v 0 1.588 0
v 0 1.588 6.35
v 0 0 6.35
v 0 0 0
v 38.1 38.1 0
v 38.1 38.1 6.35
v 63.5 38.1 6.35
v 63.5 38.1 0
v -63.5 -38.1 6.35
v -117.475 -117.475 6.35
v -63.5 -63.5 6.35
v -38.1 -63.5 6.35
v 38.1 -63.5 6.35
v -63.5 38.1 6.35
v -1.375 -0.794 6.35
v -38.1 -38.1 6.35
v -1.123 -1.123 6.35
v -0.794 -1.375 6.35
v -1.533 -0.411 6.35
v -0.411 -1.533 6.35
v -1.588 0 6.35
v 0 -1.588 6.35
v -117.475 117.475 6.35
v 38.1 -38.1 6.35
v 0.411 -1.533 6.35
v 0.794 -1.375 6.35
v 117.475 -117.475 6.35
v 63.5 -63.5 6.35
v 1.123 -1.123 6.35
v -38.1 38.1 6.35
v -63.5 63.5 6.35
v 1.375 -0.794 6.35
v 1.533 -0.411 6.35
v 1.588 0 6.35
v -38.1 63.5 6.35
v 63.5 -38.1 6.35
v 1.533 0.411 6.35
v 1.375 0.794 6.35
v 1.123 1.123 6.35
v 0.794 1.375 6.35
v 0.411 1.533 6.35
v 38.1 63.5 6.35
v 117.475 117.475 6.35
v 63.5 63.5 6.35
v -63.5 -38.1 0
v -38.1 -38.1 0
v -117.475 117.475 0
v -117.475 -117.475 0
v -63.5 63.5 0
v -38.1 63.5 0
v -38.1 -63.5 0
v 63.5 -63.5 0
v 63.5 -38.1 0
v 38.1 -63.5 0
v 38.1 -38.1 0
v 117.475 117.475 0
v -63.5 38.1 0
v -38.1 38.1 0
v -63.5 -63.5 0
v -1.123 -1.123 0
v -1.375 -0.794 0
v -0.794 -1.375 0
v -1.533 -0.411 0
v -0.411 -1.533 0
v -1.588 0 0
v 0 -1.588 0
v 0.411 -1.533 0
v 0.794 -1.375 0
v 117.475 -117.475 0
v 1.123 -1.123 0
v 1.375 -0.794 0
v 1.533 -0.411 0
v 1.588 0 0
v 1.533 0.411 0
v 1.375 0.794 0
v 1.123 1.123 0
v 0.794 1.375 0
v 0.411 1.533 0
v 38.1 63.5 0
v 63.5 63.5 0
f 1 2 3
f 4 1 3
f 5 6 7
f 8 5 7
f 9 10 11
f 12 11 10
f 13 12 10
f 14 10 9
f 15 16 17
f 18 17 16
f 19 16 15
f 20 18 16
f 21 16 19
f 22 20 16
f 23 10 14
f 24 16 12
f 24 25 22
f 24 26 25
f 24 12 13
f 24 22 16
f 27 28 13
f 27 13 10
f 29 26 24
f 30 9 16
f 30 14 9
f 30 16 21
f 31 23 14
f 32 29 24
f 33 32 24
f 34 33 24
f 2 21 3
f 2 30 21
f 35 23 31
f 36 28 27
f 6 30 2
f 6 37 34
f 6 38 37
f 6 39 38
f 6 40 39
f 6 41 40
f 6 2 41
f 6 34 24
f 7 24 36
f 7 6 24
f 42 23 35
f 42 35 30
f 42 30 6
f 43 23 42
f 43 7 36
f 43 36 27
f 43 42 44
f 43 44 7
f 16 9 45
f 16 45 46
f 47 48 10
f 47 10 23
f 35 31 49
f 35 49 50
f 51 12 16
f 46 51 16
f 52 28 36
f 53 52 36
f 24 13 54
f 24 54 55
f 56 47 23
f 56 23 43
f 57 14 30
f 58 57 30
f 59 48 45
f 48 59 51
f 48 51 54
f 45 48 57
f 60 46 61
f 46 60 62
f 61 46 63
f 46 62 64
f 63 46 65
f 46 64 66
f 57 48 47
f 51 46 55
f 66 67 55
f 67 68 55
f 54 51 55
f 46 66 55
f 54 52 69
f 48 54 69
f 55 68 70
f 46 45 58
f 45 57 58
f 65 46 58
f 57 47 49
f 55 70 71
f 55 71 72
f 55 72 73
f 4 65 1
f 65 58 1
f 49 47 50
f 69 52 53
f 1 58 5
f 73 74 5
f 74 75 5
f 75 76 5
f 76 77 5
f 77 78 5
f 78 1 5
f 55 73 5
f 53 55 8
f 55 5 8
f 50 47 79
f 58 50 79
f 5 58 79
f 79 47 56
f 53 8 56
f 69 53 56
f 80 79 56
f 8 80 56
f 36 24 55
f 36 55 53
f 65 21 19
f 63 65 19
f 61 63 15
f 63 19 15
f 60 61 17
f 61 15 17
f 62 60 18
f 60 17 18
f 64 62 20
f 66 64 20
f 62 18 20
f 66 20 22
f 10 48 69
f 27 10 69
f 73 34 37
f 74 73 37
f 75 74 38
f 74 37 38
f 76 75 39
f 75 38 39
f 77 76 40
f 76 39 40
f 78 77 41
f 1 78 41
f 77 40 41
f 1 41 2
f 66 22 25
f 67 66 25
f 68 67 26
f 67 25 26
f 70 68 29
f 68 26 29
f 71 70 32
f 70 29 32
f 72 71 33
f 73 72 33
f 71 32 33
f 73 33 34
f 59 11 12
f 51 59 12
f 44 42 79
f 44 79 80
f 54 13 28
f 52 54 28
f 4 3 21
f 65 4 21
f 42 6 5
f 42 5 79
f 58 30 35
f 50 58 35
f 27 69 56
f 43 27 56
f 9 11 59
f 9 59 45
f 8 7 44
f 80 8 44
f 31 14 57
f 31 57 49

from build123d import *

# Parameters (mm, degrees)
F0_W     = 234.95
F0_H     = 234.95
F1_DEPTH = 6.35
F2_W     = 25.4
F2_H     = 25.4
F3_DEPTH = 25.4


with BuildPart() as f1:
    # F0 (on Top) → F1 (new body)
    with BuildSketch(Plane.XY):
        Rectangle(F0_W, F0_H)
    extrude(amount=F1_DEPTH)

    # F2 (on face) → F3 (cut)
    with BuildSketch(Plane.XY.offset(6.35)):
        with Locations((-50.8, 50.8)):
            Rectangle(F2_W, F2_H)
        with Locations((50.8, 50.8)):
            Rectangle(F2_W, F2_H)
        with Locations((50.8, -50.8)):
            Rectangle(F2_W, F2_H)
        with Locations((-50.8, -50.8)):
            Rectangle(F2_W, F2_H)
        with BuildLine():
            ThreePointArc((1.5875, 0), (1.1225320151, 1.1225320151), (0, 1.5875))
            Line((0, 1.5875), (0, 0))
            Line((0, 0), (1.5875, 0))
        make_face()
        with BuildLine():
            Line((0, -1.5875), (0, 0))
            Line((0, 0), (-1.5875, 0))
            ThreePointArc((-1.5875, 0), (-1.1225320151, -1.1225320151), (0, -1.5875))
        make_face()
        with BuildLine():
            ThreePointArc((0, -1.5875), (1.1225320151, -1.1225320151), (1.5875, 0))
            Line((1.5875, 0), (0, 0))
            Line((0, 0), (0, -1.5875))
        make_face()
    extrude(amount=-F3_DEPTH, mode=Mode.SUBTRACT)


solid = f1.part
